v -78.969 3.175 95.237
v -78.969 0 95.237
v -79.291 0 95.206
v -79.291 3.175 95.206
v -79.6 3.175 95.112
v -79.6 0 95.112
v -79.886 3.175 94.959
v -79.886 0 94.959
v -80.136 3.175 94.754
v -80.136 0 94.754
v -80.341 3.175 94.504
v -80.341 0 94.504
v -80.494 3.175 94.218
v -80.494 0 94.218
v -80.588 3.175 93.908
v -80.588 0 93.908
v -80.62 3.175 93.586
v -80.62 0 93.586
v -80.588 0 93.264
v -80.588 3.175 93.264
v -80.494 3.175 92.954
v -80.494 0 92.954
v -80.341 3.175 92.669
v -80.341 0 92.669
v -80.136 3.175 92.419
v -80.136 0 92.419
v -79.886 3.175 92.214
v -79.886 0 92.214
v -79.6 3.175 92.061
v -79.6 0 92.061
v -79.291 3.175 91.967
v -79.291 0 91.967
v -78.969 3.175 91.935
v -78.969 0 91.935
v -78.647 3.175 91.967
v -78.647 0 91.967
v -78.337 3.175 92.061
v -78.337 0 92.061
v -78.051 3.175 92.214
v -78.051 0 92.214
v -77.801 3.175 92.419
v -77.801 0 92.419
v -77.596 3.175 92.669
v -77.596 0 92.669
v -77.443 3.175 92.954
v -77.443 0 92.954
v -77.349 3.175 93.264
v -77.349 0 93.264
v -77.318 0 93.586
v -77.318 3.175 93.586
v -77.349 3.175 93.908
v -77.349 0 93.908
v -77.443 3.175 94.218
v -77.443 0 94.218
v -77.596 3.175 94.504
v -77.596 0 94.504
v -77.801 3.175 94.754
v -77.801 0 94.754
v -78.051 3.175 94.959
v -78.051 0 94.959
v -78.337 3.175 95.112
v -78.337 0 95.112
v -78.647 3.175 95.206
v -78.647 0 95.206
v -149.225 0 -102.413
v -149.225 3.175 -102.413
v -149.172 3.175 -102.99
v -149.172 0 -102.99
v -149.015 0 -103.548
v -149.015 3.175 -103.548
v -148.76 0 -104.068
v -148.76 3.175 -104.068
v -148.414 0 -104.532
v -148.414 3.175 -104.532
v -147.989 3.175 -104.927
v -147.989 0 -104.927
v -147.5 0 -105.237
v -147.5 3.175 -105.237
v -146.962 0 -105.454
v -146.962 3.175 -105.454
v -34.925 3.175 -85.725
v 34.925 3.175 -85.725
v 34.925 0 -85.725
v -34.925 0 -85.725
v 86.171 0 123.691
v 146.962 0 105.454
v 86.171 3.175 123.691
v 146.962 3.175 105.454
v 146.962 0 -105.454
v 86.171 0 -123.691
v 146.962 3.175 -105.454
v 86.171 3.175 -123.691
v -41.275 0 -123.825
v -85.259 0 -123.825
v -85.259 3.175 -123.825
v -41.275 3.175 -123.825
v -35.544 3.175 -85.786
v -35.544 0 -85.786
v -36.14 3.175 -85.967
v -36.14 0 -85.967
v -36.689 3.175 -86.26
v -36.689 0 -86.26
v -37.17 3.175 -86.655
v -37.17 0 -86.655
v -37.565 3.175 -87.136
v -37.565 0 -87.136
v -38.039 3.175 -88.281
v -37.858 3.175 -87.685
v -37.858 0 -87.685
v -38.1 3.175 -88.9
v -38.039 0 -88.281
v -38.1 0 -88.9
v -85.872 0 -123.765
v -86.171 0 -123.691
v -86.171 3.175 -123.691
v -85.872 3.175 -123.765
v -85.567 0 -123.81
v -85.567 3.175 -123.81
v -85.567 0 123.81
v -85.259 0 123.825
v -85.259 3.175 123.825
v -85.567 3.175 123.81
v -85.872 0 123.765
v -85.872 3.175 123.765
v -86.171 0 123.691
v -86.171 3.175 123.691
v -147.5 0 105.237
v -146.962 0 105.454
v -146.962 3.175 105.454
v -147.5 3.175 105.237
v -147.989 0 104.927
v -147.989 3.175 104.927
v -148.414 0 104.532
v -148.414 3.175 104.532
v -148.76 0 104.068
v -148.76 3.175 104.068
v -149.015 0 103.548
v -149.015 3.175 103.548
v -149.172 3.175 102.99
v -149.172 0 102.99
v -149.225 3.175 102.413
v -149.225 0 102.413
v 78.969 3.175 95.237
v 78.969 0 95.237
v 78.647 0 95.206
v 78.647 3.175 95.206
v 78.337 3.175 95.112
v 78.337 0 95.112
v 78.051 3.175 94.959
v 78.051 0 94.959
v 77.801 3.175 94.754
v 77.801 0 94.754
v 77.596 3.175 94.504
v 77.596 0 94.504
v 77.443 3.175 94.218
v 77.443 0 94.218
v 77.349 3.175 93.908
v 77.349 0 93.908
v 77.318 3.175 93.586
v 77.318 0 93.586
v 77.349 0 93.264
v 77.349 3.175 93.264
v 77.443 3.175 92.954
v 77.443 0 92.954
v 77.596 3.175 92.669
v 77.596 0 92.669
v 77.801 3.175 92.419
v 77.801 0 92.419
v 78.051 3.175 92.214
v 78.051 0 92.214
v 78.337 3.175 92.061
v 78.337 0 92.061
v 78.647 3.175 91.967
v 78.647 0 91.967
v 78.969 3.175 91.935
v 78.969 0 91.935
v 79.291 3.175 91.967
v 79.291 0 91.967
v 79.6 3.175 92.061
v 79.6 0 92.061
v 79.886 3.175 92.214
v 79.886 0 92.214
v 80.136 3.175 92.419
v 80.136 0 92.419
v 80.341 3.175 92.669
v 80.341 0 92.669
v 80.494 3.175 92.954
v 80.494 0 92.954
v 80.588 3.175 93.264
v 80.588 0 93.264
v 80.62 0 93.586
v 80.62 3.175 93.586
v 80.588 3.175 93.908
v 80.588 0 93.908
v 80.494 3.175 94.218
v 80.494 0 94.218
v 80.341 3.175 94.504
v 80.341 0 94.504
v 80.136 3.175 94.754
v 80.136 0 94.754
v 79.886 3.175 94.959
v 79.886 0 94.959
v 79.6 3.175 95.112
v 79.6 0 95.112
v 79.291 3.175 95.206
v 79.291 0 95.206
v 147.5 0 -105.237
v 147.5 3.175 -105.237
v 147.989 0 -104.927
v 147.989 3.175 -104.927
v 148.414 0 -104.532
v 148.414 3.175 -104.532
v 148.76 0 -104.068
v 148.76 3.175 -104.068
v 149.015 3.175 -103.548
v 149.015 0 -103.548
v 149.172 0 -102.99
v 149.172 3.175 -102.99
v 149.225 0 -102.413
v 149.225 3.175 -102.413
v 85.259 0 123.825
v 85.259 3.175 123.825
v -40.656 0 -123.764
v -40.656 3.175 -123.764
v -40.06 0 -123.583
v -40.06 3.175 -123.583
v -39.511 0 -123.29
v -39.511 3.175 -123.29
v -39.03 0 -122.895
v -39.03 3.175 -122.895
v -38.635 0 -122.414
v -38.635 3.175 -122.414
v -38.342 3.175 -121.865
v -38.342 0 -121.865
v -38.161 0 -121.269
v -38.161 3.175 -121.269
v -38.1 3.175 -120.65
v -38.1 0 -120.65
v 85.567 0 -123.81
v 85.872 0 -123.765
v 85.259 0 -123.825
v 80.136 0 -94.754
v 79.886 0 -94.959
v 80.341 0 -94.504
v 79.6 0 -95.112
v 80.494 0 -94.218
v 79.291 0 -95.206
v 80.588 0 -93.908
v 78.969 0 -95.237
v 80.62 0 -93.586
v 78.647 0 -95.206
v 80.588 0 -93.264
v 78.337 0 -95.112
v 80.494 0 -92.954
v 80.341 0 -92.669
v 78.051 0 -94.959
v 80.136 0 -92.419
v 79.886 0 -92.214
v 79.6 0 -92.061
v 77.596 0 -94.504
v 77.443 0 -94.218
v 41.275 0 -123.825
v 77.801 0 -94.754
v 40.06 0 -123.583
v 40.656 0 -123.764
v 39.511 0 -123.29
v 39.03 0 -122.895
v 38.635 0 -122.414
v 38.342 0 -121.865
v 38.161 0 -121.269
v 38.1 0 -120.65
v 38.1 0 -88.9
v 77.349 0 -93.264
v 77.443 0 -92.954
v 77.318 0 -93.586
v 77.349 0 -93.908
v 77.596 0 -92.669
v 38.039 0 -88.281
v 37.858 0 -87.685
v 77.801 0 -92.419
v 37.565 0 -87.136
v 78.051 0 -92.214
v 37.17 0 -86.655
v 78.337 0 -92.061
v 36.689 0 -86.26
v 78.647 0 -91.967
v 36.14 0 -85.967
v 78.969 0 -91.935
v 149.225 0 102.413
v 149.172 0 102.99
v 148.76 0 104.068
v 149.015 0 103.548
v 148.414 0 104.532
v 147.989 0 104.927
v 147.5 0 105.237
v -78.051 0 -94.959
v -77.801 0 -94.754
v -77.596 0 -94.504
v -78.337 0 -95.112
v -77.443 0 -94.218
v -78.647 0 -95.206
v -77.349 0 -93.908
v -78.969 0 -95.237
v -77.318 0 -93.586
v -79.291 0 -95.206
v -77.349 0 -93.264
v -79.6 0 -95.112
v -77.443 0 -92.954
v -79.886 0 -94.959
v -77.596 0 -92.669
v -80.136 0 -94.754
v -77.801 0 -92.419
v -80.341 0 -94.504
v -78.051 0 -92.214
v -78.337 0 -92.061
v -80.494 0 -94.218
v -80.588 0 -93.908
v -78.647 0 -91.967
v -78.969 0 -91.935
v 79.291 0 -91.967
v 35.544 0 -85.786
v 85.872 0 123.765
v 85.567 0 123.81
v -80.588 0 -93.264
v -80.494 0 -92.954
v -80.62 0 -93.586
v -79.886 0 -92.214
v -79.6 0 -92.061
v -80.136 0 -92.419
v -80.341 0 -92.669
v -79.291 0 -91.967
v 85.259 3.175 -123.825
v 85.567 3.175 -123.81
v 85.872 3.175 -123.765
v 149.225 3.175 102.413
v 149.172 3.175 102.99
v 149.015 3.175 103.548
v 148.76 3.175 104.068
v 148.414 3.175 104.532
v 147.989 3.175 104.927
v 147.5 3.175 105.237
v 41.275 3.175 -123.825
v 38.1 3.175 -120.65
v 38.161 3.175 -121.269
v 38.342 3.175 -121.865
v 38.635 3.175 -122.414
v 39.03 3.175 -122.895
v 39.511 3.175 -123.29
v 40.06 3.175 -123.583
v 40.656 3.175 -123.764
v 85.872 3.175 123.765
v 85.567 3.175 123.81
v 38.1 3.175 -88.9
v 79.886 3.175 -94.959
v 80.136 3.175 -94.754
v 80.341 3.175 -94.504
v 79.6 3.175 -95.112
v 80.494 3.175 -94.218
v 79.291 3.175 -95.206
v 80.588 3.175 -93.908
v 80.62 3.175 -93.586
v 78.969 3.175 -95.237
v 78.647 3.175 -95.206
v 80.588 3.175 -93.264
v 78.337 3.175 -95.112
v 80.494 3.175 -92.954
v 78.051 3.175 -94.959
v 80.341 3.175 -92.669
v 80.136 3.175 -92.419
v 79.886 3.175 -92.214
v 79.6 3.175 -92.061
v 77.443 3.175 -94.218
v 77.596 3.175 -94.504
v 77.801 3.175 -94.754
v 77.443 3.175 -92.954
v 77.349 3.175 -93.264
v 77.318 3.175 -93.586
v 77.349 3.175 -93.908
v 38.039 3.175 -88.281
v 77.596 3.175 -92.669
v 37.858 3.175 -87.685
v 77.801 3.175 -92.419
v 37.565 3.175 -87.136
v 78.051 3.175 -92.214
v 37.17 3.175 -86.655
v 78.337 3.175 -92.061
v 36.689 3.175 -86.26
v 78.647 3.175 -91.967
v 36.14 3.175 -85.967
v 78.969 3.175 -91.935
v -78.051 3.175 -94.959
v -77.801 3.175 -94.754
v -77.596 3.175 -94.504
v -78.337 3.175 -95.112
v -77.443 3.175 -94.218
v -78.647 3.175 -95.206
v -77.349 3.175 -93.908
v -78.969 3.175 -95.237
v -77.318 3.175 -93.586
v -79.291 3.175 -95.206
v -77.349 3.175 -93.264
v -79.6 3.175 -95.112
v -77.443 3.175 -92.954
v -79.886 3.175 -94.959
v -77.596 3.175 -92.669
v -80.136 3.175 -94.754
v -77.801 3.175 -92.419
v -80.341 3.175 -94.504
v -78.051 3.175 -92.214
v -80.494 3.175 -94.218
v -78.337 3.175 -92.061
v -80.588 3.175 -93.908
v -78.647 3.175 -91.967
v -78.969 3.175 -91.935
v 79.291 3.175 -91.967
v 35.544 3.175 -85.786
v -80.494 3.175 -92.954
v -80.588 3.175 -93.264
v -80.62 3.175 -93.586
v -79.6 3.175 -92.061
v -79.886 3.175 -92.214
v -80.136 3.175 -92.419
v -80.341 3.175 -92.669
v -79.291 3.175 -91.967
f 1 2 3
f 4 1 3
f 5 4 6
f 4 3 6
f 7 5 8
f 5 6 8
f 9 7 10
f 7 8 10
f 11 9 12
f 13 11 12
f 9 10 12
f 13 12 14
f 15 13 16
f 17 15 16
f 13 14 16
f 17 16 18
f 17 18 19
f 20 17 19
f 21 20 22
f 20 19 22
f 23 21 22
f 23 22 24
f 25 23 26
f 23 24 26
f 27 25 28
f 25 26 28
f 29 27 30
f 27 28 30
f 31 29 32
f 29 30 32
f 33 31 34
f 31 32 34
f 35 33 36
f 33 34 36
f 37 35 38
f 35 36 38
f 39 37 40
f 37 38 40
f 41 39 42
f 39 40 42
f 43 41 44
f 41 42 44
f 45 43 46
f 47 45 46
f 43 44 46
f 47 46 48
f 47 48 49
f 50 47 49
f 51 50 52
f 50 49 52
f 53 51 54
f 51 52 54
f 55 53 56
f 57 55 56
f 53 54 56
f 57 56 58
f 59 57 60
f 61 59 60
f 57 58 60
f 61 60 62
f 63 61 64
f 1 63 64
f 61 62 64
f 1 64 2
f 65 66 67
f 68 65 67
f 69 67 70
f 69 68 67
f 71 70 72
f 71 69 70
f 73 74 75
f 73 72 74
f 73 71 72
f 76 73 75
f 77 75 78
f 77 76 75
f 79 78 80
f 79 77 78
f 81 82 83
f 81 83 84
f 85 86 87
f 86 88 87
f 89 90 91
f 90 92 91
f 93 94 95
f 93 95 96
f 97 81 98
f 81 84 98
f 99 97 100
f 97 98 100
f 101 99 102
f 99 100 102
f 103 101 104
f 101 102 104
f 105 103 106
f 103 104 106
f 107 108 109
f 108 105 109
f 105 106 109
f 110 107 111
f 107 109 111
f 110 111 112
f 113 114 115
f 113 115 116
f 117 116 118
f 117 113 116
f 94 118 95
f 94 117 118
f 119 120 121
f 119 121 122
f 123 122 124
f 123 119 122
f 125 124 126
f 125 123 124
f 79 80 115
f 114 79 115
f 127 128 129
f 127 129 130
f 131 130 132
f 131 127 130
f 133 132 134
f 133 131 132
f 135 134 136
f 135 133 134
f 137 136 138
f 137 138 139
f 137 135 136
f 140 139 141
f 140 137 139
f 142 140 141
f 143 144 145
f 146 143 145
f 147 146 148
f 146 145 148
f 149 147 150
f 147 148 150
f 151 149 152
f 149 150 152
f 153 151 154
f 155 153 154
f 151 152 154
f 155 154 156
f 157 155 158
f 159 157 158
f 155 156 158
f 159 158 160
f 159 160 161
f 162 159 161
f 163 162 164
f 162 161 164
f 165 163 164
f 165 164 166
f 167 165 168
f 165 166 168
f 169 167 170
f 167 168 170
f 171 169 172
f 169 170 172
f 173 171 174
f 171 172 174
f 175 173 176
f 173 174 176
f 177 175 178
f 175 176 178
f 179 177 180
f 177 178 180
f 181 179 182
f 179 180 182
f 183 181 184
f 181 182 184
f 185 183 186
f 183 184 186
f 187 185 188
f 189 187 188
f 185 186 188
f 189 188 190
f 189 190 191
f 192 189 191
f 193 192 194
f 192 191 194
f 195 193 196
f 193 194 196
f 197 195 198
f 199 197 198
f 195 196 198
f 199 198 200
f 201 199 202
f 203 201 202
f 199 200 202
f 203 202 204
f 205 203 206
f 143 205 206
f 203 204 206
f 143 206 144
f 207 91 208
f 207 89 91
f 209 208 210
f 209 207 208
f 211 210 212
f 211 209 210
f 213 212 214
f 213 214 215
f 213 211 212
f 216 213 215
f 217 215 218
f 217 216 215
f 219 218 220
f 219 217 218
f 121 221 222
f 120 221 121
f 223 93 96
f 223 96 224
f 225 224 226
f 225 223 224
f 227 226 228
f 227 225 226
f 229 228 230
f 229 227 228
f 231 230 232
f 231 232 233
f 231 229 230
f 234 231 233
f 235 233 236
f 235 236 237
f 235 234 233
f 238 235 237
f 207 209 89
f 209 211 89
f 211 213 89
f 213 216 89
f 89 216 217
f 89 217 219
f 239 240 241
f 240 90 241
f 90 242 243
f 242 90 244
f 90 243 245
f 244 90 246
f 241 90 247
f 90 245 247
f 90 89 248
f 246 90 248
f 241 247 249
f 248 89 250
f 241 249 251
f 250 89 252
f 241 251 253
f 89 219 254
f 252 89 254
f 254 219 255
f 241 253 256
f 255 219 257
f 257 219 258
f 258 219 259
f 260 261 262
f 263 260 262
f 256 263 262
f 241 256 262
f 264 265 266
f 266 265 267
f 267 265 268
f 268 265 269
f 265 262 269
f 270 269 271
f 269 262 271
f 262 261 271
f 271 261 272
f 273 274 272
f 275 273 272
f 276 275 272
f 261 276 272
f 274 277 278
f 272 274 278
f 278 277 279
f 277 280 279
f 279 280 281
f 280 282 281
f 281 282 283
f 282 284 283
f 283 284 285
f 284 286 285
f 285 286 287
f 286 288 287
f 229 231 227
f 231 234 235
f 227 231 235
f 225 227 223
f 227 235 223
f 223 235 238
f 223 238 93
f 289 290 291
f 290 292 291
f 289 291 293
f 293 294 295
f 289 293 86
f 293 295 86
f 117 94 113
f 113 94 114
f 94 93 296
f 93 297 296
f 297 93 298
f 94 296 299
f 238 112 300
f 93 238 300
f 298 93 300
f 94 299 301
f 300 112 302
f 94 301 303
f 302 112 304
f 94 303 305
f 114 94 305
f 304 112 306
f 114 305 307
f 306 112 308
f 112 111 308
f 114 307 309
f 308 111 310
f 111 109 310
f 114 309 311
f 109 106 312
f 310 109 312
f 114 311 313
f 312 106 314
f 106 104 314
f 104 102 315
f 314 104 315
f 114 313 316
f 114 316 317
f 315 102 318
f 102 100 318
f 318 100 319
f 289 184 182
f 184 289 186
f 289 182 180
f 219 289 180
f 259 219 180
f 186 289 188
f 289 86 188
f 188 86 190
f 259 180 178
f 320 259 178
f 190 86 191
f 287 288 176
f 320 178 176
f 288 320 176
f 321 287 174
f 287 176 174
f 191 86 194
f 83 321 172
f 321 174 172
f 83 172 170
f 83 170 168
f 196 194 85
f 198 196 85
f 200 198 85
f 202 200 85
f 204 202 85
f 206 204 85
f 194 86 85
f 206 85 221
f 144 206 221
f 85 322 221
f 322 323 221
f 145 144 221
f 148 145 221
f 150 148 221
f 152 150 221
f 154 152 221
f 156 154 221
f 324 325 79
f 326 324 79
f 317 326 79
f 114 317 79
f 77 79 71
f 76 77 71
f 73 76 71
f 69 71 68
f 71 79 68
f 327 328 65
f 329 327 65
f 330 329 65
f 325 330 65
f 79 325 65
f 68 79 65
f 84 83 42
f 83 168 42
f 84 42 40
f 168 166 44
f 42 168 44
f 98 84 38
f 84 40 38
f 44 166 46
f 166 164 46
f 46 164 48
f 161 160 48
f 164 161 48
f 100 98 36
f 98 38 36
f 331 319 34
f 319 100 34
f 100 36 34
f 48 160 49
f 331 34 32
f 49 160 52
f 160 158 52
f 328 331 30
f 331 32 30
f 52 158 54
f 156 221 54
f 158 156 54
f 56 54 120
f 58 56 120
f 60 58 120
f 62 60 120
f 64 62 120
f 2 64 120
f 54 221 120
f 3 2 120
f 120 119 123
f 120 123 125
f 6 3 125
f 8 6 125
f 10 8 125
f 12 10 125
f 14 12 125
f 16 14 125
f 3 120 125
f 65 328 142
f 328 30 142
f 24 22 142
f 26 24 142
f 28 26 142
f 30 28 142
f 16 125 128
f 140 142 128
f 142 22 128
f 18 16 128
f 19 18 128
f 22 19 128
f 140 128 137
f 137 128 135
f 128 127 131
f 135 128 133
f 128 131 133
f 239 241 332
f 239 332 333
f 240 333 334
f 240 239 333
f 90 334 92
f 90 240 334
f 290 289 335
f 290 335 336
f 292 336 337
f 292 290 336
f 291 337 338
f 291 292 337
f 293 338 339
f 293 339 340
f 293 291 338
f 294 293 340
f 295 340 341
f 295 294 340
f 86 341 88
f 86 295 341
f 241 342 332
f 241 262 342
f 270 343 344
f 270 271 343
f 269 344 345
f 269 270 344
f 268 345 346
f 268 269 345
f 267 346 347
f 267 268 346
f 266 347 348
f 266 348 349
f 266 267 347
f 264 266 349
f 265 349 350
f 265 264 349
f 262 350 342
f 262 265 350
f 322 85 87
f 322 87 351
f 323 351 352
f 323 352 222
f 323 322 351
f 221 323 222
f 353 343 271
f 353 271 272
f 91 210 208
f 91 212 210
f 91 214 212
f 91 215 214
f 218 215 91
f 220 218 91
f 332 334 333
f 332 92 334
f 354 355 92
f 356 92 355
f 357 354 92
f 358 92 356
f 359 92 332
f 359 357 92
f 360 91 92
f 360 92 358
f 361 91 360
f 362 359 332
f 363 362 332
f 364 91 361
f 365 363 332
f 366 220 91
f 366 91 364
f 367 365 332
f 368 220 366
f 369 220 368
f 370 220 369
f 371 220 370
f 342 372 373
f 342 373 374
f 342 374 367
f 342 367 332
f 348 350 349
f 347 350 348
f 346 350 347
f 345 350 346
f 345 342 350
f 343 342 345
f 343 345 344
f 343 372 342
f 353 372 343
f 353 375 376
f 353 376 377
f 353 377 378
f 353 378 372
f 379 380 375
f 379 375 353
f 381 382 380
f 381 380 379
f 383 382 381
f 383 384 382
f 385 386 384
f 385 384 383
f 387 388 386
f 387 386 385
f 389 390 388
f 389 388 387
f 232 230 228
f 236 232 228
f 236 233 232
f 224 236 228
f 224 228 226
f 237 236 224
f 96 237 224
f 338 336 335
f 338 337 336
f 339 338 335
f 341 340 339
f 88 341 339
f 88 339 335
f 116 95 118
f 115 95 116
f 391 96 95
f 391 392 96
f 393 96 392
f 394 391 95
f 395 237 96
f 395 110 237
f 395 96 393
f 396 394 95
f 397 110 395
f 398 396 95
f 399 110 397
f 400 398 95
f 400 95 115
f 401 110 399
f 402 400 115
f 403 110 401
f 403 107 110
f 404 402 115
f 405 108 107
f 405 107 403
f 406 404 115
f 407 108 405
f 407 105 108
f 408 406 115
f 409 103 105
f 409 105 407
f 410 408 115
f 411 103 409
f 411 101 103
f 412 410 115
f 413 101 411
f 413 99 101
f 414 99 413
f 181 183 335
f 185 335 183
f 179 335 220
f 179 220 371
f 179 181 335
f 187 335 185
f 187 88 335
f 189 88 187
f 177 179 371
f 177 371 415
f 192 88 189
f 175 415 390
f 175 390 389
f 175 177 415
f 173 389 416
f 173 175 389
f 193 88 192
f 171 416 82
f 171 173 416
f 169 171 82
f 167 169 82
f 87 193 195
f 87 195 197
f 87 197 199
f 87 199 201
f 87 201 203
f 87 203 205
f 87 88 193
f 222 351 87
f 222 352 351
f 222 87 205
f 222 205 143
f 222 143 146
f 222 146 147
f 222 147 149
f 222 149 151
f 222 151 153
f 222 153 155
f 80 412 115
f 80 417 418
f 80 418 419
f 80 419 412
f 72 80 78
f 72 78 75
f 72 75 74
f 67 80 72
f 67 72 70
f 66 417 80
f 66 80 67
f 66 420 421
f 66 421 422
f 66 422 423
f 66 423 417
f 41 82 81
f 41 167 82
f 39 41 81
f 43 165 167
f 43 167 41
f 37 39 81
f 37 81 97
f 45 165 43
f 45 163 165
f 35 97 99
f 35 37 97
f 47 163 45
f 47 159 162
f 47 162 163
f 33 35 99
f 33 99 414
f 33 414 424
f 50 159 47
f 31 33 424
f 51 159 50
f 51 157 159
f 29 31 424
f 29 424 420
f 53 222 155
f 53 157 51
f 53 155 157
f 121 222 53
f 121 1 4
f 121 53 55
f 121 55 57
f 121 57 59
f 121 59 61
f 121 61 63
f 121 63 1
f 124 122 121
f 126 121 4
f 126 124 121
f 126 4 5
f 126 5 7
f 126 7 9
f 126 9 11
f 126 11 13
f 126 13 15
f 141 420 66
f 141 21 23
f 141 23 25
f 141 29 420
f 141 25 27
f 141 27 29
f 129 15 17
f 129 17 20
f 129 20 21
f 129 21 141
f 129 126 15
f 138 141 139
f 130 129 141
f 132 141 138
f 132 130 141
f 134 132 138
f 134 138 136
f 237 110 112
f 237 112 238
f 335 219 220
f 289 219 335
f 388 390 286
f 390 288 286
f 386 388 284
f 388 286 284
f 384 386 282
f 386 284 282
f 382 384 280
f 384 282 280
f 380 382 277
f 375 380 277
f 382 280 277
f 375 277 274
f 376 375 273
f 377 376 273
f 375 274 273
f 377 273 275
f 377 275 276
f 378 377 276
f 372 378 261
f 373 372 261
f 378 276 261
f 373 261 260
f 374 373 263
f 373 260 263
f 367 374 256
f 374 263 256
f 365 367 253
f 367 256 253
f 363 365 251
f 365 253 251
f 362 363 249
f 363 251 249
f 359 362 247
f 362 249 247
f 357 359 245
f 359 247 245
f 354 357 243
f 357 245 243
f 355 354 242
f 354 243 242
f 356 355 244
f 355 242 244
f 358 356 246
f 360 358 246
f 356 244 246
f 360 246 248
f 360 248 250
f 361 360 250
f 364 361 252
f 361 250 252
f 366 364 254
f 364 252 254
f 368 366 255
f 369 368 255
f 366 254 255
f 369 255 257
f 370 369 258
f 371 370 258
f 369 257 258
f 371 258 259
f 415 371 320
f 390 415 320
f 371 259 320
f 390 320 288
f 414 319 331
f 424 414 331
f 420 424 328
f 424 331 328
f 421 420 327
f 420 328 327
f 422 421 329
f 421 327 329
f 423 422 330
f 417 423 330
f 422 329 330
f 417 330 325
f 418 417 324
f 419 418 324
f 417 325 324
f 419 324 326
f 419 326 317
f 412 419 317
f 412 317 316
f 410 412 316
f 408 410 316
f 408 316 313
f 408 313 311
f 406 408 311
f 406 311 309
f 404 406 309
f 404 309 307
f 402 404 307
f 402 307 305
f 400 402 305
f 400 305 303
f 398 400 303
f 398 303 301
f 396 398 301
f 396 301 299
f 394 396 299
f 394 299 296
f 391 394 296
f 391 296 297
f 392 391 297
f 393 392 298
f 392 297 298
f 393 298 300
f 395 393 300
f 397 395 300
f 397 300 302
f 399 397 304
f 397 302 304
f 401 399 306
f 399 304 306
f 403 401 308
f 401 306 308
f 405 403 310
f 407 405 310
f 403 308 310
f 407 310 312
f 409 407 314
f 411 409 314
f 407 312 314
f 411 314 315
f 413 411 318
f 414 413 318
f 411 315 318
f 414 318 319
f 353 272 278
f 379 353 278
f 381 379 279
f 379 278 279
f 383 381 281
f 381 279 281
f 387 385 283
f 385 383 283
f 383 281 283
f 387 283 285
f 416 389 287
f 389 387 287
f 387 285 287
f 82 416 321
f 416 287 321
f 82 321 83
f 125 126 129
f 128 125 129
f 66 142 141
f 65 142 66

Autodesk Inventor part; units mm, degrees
ref_plane "YZ Plane" through (0, 0, 0) normal (1, 0, 0) x (0, 1, 0)
ref_plane "XZ Plane" through (0, 0, 0) normal (0, 1, 0) x (-1, 0, 0)
ref_plane "XY Plane" through (0, 0, 0) normal (0, 0, 1) x (1, 0, 0)
sketch "Sketch1" plane through (0, 0, 0) normal (0, 1, 0) x (-1, 0, 0)
  line L0 (149.225, -123.825) -> (-149.225, -123.825)
  line L1 (-149.225, -123.825) -> (-149.225, 123.825)
  line L2 (-149.225, 123.825) -> (149.225, 123.825)
  line L3 (149.225, 123.825) -> (149.225, -123.825)
  line L4 (149.225, -123.825) -> (-149.225, 123.825) construction
  line L5 (-149.225, -123.825) -> (149.225, 123.825) construction
  point P0 (0, 0)
  dimension "d0" = 298.45
  dimension "d1" = 247.65
extrude "Extrusion1" add sketch "Sketch1" along normal blind 3.175
sketch "Sketch2" plane through (0, 3.175, 0) normal (0, 1, 0) x (1, 0, 0)
  line L0 (149.225, 123.825) -> (-149.225, 123.825) projected
  line L1 (-149.225, 123.825) -> (-149.225, -123.825) projected
  line L2 (-149.225, -123.825) -> (149.225, -123.825) projected
  line L3 (149.225, -123.825) -> (149.225, 123.825) projected
  line L4 (-149.225, 104.775) -> (-85.725, 123.825)
  line L5 (85.725, 123.825) -> (149.225, 104.775)
  line L6 (149.225, -104.775) -> (85.725, -123.825)
  line L7 (-85.725, -123.825) -> (-149.225, -104.775)
  point P0 (0, 0)
  dimension "d4" = 19.05
  dimension "d5" = 19.05
  dimension "d6" = 19.05
  dimension "d7" = 19.05
  dimension "d8" = 63.5
  dimension "d9" = 63.5
  dimension "d10" = 63.5
extrude "Extrusion2" cut sketch "Sketch2" against normal blind 3.175 contours L3 L5 L0 | L4 L1 L0 | L3 L2 L6 | L7 L2 L1
sketch "Sketch3" plane through (0, 3.175, 0) normal (0, 1, 0) x (1, 0, 0)
  line L0 (85.725, 123.825) -> (-85.725, 123.825) projected
  line L1 (-38.1, 123.825) -> (38.1, 123.825)
  line L2 (38.1, 123.825) -> (38.1, 85.725)
  line L3 (38.1, 85.725) -> (-38.1, 85.725)
  line L4 (-38.1, 85.725) -> (-38.1, 123.825)
  point P0 (0, 0)
  point P1 (0, 85.725)
  dimension "d13" = 38.1
  dimension "d14" = 76.2
extrude "Extrusion3" cut sketch "Sketch3" against normal blind 3.175
fillet "Fillet1" radius 3.175 12 edges at (38.1, 1.5875, -85.725) (-38.1, 1.5875, -85.725) (38.1, 1.5875, -123.825) (-38.1, 1.5875, -123.825) (85.725, 1.5875, -123.825) (-85.725, 1.5875, -123.825) (-149.225, 1.5875, -104.775) (149.225, 1.5875, -104.775) (-149.225, 1.5875, 104.775) (-85.725, 1.5875, 123.825) (85.725, 1.5875, 123.825) (149.225, 1.5875, 104.775)
sketch "Sketch4" plane through (0, 3.175, 0) normal (0, 1, 0) x (1, 0, 0)
  point P0 (0, 0)
  point P1 (-78.9686, 93.5863)
  point P2 (-78.9686, -93.5863)
  point P3 (78.9686, -93.5863)
  point P4 (78.9686, 93.5863)
  dimension "d18" = 93.5863
  dimension "d19" = 93.5863
  dimension "d20" = 78.9686
  dimension "d21" = 78.9686
hole "Hole1" at (-78.9686, 3.175, -93.5863) at (-78.9686, 3.175, 93.5863) at (78.9686, 3.175, 93.5863) at (78.9686, 3.175, -93.5863) direction (0, -1, 0) diameter 3.302 end through all
equation "\"d18\" = d19"
properties part number "SwarmieCoverPlate"
